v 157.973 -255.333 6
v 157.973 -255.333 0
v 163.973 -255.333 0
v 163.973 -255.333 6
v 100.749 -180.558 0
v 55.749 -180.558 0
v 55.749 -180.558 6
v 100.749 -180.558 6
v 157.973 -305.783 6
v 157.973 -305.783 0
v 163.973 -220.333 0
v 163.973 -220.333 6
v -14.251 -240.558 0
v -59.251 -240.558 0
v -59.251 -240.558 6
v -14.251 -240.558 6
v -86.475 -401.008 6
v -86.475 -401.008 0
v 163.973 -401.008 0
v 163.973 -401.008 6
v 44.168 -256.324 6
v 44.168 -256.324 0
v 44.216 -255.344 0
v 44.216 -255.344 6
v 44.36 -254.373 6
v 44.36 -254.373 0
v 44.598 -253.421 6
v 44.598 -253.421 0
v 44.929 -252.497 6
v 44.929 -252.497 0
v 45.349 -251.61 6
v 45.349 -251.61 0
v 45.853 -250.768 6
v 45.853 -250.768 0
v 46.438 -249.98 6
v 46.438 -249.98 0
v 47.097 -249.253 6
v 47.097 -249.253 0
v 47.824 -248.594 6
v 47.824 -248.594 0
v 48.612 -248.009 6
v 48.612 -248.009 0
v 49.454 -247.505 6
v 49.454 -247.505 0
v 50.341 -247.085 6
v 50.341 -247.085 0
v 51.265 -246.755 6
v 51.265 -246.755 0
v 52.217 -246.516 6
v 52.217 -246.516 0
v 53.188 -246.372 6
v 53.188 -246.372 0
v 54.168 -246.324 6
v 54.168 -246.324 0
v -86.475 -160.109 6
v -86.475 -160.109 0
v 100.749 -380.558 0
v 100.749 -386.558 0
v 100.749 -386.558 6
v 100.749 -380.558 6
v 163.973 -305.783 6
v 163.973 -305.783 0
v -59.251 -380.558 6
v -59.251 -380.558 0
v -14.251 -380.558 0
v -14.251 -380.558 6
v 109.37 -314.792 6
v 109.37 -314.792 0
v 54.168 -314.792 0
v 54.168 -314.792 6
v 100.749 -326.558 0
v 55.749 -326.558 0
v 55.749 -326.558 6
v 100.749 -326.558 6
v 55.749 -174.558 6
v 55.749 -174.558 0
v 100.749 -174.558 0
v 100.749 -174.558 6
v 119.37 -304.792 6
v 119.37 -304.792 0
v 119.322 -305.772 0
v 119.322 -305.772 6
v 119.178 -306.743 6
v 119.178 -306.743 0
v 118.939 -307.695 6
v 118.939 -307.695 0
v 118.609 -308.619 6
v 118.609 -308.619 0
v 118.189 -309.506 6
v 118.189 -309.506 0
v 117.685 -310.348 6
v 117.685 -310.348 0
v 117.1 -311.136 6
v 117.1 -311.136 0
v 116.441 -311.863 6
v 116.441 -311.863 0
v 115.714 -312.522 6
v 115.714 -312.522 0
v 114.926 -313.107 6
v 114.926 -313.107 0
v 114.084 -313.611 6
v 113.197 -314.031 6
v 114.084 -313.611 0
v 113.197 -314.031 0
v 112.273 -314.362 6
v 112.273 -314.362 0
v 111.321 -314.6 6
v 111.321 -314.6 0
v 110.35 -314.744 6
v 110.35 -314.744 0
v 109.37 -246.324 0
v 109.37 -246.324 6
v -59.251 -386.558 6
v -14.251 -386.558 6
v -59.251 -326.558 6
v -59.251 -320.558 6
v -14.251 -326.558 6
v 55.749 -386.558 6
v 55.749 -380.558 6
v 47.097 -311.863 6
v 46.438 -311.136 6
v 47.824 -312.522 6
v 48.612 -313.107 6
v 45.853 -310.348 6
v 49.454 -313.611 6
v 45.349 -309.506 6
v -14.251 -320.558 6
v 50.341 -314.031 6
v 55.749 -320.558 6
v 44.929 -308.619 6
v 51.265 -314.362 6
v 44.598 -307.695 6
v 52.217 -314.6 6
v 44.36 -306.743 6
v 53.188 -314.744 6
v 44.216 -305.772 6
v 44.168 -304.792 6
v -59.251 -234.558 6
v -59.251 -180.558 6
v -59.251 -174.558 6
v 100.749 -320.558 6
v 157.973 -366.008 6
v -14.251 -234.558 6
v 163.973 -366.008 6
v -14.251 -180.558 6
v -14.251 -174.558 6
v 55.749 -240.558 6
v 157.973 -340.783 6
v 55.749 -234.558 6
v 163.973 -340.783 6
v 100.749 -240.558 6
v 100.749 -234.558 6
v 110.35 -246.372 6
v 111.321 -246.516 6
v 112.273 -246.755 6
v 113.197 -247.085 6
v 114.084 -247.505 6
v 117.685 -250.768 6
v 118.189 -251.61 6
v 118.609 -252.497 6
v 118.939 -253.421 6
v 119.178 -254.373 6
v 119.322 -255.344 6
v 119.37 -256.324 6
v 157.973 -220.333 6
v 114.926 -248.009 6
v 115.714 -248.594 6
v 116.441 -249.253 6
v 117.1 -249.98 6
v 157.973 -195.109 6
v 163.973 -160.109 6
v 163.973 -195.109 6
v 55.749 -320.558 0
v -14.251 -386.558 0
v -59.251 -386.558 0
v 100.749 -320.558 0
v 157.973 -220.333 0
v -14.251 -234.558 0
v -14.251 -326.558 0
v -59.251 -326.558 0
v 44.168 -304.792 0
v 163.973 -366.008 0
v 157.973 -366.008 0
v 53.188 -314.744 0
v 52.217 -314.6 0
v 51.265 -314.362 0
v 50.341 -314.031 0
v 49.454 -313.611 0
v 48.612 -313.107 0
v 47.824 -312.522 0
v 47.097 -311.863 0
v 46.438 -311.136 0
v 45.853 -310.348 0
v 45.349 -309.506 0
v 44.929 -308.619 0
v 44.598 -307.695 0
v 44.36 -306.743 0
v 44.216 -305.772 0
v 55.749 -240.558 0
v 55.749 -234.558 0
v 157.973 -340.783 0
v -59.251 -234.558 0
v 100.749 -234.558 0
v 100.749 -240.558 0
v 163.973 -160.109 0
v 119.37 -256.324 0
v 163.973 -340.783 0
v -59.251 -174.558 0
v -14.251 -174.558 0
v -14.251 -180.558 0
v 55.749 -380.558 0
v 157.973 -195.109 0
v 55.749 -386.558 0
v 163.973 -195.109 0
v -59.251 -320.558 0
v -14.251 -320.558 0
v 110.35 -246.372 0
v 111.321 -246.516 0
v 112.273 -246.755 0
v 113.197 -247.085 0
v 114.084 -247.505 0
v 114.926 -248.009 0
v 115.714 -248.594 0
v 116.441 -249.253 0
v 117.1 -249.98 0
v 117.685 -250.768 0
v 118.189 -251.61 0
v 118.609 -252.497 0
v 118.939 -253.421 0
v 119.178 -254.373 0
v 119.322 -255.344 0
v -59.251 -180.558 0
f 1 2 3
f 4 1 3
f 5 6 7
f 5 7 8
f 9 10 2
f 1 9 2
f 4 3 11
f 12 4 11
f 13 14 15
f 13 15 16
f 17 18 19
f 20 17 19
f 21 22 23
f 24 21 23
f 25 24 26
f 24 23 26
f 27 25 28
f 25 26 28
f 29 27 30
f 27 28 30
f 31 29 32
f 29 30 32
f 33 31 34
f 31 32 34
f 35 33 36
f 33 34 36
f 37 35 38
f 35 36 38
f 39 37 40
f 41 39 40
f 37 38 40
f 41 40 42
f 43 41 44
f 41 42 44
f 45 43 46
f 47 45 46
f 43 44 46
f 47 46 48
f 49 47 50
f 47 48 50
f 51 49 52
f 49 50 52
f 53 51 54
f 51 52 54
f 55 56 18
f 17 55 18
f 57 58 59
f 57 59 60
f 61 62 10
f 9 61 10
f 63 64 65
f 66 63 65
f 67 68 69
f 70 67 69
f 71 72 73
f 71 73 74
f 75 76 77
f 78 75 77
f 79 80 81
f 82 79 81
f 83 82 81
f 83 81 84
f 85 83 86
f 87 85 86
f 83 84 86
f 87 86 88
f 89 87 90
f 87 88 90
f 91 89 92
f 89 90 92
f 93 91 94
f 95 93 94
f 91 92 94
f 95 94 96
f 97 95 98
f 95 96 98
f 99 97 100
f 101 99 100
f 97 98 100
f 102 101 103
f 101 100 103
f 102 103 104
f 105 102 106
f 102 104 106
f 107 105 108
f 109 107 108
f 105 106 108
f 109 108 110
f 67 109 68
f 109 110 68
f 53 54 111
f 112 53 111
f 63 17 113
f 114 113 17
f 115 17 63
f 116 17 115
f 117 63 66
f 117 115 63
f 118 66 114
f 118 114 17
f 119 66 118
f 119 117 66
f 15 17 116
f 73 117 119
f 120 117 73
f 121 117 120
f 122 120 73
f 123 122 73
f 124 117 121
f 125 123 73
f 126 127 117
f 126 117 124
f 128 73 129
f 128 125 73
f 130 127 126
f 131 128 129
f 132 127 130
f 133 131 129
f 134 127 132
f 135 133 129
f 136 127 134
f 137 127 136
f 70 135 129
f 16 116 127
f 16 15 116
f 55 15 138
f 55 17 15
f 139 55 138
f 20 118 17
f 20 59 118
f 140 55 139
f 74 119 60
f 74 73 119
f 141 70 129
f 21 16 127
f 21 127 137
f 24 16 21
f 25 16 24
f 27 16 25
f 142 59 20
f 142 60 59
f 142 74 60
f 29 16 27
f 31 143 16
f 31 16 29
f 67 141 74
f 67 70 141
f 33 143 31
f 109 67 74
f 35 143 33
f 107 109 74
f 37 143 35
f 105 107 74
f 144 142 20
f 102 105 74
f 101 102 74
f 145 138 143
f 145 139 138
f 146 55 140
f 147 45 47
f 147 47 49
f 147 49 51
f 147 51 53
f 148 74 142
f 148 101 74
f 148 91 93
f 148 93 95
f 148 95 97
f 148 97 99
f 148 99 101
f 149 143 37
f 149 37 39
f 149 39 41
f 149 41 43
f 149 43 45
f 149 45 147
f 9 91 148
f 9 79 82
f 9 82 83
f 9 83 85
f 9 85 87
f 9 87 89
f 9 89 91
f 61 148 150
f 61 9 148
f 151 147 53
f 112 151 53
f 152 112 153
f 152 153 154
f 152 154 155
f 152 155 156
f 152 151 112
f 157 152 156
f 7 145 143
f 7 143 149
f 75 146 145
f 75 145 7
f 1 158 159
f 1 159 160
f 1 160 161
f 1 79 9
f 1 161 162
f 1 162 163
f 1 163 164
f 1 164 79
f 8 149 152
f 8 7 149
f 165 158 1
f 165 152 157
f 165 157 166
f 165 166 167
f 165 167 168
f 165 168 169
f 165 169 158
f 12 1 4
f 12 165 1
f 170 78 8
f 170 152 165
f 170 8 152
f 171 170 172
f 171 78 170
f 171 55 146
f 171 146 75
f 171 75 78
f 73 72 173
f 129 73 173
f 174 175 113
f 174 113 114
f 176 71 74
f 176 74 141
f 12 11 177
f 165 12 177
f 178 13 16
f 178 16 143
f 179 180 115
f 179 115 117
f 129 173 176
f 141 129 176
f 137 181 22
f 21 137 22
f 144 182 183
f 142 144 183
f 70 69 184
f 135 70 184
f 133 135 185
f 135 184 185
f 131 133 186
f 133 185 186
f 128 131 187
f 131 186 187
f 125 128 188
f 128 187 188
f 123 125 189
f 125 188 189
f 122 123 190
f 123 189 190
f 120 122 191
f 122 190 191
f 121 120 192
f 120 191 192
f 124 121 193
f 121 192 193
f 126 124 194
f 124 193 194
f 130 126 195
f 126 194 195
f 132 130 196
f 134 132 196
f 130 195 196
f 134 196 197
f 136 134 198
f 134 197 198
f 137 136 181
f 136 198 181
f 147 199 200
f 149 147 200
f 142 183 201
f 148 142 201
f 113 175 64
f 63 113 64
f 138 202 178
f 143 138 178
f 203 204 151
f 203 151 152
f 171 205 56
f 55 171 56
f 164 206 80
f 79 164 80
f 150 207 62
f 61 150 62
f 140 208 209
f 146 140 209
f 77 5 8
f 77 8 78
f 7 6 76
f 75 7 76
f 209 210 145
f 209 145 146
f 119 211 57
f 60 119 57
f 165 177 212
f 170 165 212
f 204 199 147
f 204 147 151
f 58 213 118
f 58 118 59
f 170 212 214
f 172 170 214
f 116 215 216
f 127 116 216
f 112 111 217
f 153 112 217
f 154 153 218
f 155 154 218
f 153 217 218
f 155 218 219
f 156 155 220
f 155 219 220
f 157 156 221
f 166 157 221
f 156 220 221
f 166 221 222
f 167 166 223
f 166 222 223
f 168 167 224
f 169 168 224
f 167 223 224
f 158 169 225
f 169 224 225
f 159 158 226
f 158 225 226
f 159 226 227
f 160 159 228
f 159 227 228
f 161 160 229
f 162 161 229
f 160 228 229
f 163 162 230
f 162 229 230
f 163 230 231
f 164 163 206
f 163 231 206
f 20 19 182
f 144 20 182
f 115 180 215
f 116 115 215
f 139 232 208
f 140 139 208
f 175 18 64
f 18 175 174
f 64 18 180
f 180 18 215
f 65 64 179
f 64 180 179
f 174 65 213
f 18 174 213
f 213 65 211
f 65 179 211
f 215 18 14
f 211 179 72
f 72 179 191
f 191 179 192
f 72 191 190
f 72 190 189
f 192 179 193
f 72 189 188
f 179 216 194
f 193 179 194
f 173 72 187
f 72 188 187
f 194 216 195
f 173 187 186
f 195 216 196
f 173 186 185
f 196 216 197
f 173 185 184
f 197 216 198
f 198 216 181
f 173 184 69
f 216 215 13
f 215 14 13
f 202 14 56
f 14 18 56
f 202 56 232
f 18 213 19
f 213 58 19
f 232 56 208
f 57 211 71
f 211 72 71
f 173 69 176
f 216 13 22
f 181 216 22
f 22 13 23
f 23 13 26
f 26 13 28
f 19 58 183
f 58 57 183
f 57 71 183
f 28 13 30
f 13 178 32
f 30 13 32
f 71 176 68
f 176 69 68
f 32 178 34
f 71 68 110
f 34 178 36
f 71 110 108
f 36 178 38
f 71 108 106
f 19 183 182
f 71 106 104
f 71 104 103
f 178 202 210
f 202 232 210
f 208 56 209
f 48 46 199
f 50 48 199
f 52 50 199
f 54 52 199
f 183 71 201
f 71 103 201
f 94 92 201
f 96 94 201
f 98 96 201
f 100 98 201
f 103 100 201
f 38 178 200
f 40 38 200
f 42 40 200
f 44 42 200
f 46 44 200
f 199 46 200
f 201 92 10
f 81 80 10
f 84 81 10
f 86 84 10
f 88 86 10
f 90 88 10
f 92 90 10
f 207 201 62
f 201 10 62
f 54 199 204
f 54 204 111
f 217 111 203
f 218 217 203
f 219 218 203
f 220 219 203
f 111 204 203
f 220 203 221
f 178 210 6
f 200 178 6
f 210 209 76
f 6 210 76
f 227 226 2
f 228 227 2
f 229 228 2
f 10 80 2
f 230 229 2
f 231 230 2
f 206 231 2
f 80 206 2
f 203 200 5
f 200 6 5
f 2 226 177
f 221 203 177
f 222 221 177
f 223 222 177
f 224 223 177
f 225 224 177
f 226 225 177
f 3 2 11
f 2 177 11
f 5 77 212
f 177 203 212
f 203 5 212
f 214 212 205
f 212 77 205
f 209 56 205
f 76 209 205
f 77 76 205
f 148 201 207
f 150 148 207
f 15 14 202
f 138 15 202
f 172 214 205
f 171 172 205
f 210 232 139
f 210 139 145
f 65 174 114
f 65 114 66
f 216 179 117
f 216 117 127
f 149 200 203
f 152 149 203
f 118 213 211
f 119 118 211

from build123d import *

# Parameters (mm, degrees)
SKETCH1_W           = 45
SKETCH1_H           = 6
BOSS_EXTRUDE1_DEPTH = 6


with BuildPart() as part:
    # Sketch1 → Boss-Extrude1 (new body)
    with BuildSketch(Plane.XY):
        Polygon((127.972610893, -160.108528092), (-86.474936563, -160.108528092), (-86.474936563, -401.007755411), (127.972610893, -401.007755411), (157.972610893, -401.007755411), (163.972610893, -401.007755411), (163.972610893, -366.007755411), (157.972610893, -366.007755411), (157.972610893, -340.782948582), (163.972610893, -340.782948582), (163.972610893, -305.782948582), (157.972610893, -305.782948582), (157.972610893, -255.333334922), (163.972610893, -255.333334922), (163.972610893, -220.333334922), (157.972610893, -220.333334922), (157.972610893, -195.108528092), (163.972610893, -195.108528092), (163.972610893, -160.108528092), (157.972610893, -160.108528092), align=None)
        with Locations((-36.751162835, -237.558141752)):
            Rectangle(SKETCH1_W, SKETCH1_H, mode=Mode.SUBTRACT)
        with Locations((78.248837165, -237.558141752)):
            Rectangle(SKETCH1_W, SKETCH1_H, mode=Mode.SUBTRACT)
        with Locations((-36.751162835, -177.558141752)):
            Rectangle(SKETCH1_W, SKETCH1_H, mode=Mode.SUBTRACT)
        with Locations((78.248837165, -177.558141752)):
            Rectangle(SKETCH1_W, SKETCH1_H, mode=Mode.SUBTRACT)
        with Locations((-36.751162835, -383.558141752)):
            Rectangle(SKETCH1_W, SKETCH1_H, mode=Mode.SUBTRACT)
        with Locations((78.248837165, -383.558141752)):
            Rectangle(SKETCH1_W, SKETCH1_H, mode=Mode.SUBTRACT)
        with Locations((78.248837165, -323.558141752)):
            Rectangle(SKETCH1_W, SKETCH1_H, mode=Mode.SUBTRACT)
        with Locations((-36.751162835, -323.558141752)):
            Rectangle(SKETCH1_W, SKETCH1_H, mode=Mode.SUBTRACT)
        with BuildLine():
            Line((54.167727184, -246.324076289), (109.370044405, -246.324076289))
            ThreePointArc((109.370044405, -246.324076289), (116.441112216, -249.253008477), (119.370044405, -256.324076289))
            Line((119.370044405, -256.324076289), (119.370044405, -304.792207215))
            ThreePointArc((119.370044405, -304.792207215), (116.441112216, -311.863275027), (109.370044405, -314.792207215))
            Line((109.370044405, -314.792207215), (54.167727184, -314.792207215))
            ThreePointArc((54.167727184, -314.792207215), (47.096659372, -311.863275027), (44.167727184, -304.792207215))
            Line((44.167727184, -304.792207215), (44.167727184, -256.324076289))
            ThreePointArc((44.167727184, -256.324076289), (47.096659372, -249.253008477), (54.167727184, -246.324076289))
        make_face(mode=Mode.SUBTRACT)
    extrude(amount=BOSS_EXTRUDE1_DEPTH)


solid = part.part
